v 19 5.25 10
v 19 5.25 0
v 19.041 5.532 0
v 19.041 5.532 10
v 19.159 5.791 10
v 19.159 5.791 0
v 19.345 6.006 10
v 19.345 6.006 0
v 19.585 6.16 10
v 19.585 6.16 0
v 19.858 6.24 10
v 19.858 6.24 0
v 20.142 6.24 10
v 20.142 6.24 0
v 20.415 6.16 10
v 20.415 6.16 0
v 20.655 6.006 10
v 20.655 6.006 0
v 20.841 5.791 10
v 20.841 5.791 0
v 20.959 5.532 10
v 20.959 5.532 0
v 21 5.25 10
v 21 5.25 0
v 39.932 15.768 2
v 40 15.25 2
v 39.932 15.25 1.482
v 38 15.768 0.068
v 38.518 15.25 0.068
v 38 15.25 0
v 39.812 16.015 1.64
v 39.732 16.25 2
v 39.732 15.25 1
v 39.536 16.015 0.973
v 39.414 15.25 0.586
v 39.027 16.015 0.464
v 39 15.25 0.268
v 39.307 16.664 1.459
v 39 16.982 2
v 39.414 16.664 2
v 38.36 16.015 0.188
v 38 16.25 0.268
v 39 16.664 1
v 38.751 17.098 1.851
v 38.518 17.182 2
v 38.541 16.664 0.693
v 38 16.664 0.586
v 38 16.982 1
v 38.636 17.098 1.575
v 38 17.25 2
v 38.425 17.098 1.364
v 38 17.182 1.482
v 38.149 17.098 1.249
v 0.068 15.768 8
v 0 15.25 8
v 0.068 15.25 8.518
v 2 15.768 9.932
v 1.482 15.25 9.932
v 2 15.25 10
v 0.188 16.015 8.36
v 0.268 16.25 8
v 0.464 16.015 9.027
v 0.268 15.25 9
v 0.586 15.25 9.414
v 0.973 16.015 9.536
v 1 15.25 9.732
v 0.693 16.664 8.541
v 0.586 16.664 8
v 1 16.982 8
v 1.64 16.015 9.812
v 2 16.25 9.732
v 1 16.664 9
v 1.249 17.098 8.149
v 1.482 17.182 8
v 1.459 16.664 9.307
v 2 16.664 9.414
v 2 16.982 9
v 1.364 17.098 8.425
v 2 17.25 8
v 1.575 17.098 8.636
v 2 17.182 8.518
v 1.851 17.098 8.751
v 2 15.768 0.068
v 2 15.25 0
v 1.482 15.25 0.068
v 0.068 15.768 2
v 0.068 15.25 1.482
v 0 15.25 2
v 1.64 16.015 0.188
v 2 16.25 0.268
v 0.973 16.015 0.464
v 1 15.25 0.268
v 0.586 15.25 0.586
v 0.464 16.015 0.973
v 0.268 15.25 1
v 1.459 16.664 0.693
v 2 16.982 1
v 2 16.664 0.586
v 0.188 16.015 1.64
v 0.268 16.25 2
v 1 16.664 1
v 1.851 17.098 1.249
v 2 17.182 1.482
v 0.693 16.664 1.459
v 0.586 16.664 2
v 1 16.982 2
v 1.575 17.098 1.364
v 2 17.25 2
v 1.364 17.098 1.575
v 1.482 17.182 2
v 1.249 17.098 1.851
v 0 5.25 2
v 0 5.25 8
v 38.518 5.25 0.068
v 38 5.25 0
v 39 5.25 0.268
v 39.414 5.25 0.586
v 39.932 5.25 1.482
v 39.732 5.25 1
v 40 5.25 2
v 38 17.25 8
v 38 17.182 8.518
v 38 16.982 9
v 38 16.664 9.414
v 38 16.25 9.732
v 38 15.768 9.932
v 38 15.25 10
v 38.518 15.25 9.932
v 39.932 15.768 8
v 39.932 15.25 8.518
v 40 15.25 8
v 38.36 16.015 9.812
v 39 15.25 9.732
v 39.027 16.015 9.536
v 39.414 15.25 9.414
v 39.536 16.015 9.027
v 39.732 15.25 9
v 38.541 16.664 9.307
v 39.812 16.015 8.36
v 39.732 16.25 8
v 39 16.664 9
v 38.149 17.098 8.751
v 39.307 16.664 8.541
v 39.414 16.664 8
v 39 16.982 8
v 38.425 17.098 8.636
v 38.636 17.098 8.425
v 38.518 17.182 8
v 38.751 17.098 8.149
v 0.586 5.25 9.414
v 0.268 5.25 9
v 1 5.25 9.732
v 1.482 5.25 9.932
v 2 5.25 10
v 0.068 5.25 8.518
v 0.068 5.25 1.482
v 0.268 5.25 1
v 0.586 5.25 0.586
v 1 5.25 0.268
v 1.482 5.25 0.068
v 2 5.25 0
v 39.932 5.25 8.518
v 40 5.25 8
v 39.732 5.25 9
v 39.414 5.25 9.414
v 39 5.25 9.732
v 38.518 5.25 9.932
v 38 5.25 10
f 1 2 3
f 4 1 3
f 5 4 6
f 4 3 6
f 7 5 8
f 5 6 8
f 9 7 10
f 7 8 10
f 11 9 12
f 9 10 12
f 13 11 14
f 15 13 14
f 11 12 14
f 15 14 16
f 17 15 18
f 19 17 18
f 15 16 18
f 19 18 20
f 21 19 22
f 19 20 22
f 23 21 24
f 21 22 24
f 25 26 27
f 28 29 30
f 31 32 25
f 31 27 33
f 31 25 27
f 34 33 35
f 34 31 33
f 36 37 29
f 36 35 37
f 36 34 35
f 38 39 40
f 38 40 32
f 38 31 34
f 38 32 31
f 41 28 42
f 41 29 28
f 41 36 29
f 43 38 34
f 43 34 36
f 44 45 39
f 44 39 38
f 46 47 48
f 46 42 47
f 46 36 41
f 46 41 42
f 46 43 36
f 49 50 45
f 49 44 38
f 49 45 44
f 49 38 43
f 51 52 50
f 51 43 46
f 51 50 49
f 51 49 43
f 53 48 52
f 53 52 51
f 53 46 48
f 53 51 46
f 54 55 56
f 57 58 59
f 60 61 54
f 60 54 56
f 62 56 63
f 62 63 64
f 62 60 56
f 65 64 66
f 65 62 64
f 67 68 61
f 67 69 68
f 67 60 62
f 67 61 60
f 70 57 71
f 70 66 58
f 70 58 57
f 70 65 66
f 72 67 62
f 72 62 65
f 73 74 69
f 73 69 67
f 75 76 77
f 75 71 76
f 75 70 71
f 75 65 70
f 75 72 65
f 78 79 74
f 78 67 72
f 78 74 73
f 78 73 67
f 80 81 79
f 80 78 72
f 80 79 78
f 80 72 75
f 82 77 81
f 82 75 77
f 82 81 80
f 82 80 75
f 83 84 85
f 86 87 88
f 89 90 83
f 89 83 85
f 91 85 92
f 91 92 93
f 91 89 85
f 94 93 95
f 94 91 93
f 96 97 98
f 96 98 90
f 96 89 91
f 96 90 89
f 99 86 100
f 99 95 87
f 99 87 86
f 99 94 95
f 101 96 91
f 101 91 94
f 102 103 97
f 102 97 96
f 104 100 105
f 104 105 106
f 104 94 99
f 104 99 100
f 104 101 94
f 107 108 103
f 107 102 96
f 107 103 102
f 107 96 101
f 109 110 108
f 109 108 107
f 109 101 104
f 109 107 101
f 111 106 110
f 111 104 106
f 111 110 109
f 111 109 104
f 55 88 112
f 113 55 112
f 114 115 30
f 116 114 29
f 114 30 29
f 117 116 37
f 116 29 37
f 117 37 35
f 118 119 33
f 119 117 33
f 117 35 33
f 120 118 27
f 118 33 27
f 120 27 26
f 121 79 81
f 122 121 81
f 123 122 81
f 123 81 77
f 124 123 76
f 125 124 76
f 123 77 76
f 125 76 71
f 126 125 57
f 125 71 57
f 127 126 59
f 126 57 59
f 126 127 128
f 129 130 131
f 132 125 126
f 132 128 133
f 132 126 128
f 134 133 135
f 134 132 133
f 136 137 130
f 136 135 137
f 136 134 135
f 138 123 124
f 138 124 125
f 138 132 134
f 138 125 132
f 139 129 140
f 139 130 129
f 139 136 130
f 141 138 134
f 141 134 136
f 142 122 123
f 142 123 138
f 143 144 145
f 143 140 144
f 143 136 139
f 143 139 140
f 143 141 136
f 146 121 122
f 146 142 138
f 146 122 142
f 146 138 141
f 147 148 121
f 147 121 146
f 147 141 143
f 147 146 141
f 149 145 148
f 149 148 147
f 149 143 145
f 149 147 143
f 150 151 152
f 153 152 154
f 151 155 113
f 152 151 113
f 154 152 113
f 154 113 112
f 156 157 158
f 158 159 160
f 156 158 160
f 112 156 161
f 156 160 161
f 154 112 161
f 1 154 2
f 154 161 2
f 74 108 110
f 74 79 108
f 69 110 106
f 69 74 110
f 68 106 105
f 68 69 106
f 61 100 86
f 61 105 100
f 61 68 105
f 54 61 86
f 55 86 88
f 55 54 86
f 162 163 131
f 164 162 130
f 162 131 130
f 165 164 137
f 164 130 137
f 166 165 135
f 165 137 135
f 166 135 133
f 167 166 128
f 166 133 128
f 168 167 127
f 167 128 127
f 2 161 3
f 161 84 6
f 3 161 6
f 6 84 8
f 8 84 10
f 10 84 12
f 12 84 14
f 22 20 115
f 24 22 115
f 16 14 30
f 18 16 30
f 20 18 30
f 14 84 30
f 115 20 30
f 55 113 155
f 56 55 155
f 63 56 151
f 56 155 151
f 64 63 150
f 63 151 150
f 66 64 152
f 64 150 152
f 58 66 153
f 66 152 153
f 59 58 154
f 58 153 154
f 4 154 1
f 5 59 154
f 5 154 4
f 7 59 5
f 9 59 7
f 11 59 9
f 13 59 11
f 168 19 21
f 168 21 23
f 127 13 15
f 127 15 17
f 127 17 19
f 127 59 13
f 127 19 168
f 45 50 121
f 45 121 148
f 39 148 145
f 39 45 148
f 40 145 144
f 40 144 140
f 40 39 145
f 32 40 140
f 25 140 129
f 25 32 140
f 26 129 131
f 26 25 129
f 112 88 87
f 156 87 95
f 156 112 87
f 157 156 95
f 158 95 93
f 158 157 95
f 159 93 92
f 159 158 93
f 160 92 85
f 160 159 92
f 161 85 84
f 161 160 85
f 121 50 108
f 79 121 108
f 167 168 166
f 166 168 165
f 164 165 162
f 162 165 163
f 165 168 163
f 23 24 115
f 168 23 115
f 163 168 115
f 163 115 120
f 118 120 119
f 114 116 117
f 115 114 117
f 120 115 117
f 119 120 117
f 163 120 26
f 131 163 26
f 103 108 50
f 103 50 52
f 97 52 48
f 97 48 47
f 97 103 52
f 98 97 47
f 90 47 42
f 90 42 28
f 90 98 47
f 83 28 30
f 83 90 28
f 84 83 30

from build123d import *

# Parameters (mm, degrees)
F1_DEPTH     = 10
F2_R         = 2
F3_T1_DEPTH  = 15
F3_T3_DEPTH  = 6
F3_T5_DEPTH  = 36
F3_S9_W      = 2
F3_S9_H      = 2
F3_T10_DEPTH = 2
F3_S15_W     = 2
F3_S15_H     = 2
F3_T16_DEPTH = 2
F3_S21_W     = 2
F3_S21_H     = 2
F3_T22_DEPTH = 2
F3_S27_W     = 2
F3_S27_H     = 2
F3_T28_DEPTH = 2


# Not quite as in the source:
# - a fillet or chamfer that OpenCascade refuses, or shapes differently, is made with other operations: its cross-section is extruded or revolved along the edge and cut away or added


with BuildPart() as f1:
    # F0 (on Top) → F1 (new body)
    with BuildSketch(Plane.XY):
        with BuildLine():
            Line((40, 17.25), (0, 17.25))
            Line((0, 17.25), (0, 5.25))
            Line((0, 5.25), (19, 5.25))
            ThreePointArc((19, 5.25), (20, 6.25), (21, 5.25))
            Line((21, 5.25), (40, 5.25))
            Line((40, 5.25), (40, 17.25))
        make_face()
    extrude(amount=F1_DEPTH)

    # F2
    f2_edges = [f1.edges().sort_by_distance(p)[0] for p in [
        (0, 11.25, 0),
        (0, 11.25, 10),
        (0, 17.25, 5),
    ]]
    fillet(f2_edges, radius=F2_R)

    # F3: fillet of radius 2 on 5 edges, made by hand

    # F3_s2 → F3_t1 (cut)
    with BuildSketch(Plane.XZ.offset(-15.25)):
        with BuildLine():
            ThreePointArc((38, 0), (39.4142135624, 0.5857864376), (40, 2))
            Line((40, 2), (40, 0))
            Line((40, 0), (38, 0))
        make_face()
        with BuildLine():
            ThreePointArc((40, 8), (39.4142135624, 9.4142135624), (38, 10))
            Line((38, 10), (40, 10))
            Line((40, 10), (40, 8))
        make_face()
    extrude(amount=F3_T1_DEPTH, mode=Mode.SUBTRACT)

    # F3_s4 → F3_t3 (cut)
    with BuildSketch(Plane.XY.offset(2)):
        with BuildLine():
            ThreePointArc((38, 17.25), (39.4142135624, 16.6642135624), (40, 15.25))
            Line((40, 15.25), (40, 17.25))
            Line((40, 17.25), (38, 17.25))
        make_face()
    extrude(amount=F3_T3_DEPTH, mode=Mode.SUBTRACT)

    # F3_s6 → F3_t5 (cut)
    with BuildSketch(Plane.YZ.offset(2)):
        with BuildLine():
            ThreePointArc((17.25, 2), (16.6642135624, 0.5857864376), (15.25, 0))
            Line((15.25, 0), (17.25, 0))
            Line((17.25, 0), (17.25, 2))
        make_face()
        with BuildLine():
            ThreePointArc((17.25, 8), (16.6642135624, 9.4142135624), (15.25, 10))
            Line((15.25, 10), (17.25, 10))
            Line((17.25, 10), (17.25, 8))
        make_face()
    extrude(amount=F3_T5_DEPTH, mode=Mode.SUBTRACT)


with BuildPart() as f3_tool8:
    # F3_s9 → F3_t10 (new body)
    with BuildSketch(Plane.XZ.offset(-15.25)):
        with Locations((1, 9)):
            Rectangle(F3_S9_W, F3_S9_H)
    extrude(amount=-F3_T10_DEPTH)

    # F3_s11 → F3_t12 (revolve, cut)
    with BuildSketch(Plane(origin=(2, 15.25, 8), x_dir=(0.7071067812, 0, -0.7071067812), z_dir=(0.7071067812, 0, 0.7071067812))):
        with BuildLine():
            ThreePointArc((0, -2), (2, 0), (0, 2))
            Line((0, 2), (0, -2))
        make_face()
    revolve(axis=Axis((2, 15.25, 8), (0, 1, 0)), mode=Mode.SUBTRACT)


with BuildPart() as f1_1:
    add(f1.part)

    # F3_t7: cut F3_tool8
    add(f3_tool8.part, mode=Mode.SUBTRACT)


with BuildPart() as f3_tool14:
    # F3_s15 → F3_t16 (new body)
    with BuildSketch(Plane.XZ.offset(-15.25)):
        with Locations((1, 1)):
            Rectangle(F3_S15_W, F3_S15_H)
    extrude(amount=-F3_T16_DEPTH)

    # F3_s17 → F3_t18 (revolve, cut)
    with BuildSketch(Plane(origin=(2, 15.25, 2), x_dir=(0.7071067812, 0, 0.7071067812), z_dir=(-0.7071067812, 0, 0.7071067812))):
        with BuildLine():
            ThreePointArc((0, -2), (2, 0), (0, 2))
            Line((0, 2), (0, -2))
        make_face()
    revolve(axis=Axis((2, 15.25, 2), (0, 1, 0)), mode=Mode.SUBTRACT)


with BuildPart() as f1_2:
    add(f1_1.part)

    # F3_t13: cut F3_tool14
    add(f3_tool14.part, mode=Mode.SUBTRACT)


with BuildPart() as f3_tool20:
    # F3_s21 → F3_t22 (new body)
    with BuildSketch(Plane.XZ.offset(-15.25)):
        with Locations((39, 1)):
            Rectangle(F3_S21_W, F3_S21_H)
    extrude(amount=-F3_T22_DEPTH)

    # F3_s23 → F3_t24 (revolve, cut)
    with BuildSketch(Plane(origin=(38, 15.25, 2), x_dir=(-0.7071067812, 0, 0.7071067812), z_dir=(-0.7071067812, 0, -0.7071067812))):
        with BuildLine():
            ThreePointArc((0, -2), (2, 0), (0, 2))
            Line((0, 2), (0, -2))
        make_face()
    revolve(axis=Axis((38, 15.25, 2), (0, 1, 0)), mode=Mode.SUBTRACT)


with BuildPart() as f1_3:
    add(f1_2.part)

    # F3_t19: cut F3_tool20
    add(f3_tool20.part, mode=Mode.SUBTRACT)


with BuildPart() as f3_tool26:
    # F3_s27 → F3_t28 (new body)
    with BuildSketch(Plane.XZ.offset(-15.25)):
        with Locations((39, 9)):
            Rectangle(F3_S27_W, F3_S27_H)
    extrude(amount=-F3_T28_DEPTH)

    # F3_s29 → F3_t30 (revolve, cut)
    with BuildSketch(Plane(origin=(38, 15.25, 8), x_dir=(-0.7071067812, 0, -0.7071067812), z_dir=(0.7071067812, 0, -0.7071067812))):
        with BuildLine():
            ThreePointArc((0, -2), (2, 0), (0, 2))
            Line((0, 2), (0, -2))
        make_face()
    revolve(axis=Axis((38, 15.25, 8), (0, 1, 0)), mode=Mode.SUBTRACT)


with BuildPart() as f1_4:
    add(f1_3.part)

    # F3_t25: cut F3_tool26
    add(f3_tool26.part, mode=Mode.SUBTRACT)


solid = f1_4.part
